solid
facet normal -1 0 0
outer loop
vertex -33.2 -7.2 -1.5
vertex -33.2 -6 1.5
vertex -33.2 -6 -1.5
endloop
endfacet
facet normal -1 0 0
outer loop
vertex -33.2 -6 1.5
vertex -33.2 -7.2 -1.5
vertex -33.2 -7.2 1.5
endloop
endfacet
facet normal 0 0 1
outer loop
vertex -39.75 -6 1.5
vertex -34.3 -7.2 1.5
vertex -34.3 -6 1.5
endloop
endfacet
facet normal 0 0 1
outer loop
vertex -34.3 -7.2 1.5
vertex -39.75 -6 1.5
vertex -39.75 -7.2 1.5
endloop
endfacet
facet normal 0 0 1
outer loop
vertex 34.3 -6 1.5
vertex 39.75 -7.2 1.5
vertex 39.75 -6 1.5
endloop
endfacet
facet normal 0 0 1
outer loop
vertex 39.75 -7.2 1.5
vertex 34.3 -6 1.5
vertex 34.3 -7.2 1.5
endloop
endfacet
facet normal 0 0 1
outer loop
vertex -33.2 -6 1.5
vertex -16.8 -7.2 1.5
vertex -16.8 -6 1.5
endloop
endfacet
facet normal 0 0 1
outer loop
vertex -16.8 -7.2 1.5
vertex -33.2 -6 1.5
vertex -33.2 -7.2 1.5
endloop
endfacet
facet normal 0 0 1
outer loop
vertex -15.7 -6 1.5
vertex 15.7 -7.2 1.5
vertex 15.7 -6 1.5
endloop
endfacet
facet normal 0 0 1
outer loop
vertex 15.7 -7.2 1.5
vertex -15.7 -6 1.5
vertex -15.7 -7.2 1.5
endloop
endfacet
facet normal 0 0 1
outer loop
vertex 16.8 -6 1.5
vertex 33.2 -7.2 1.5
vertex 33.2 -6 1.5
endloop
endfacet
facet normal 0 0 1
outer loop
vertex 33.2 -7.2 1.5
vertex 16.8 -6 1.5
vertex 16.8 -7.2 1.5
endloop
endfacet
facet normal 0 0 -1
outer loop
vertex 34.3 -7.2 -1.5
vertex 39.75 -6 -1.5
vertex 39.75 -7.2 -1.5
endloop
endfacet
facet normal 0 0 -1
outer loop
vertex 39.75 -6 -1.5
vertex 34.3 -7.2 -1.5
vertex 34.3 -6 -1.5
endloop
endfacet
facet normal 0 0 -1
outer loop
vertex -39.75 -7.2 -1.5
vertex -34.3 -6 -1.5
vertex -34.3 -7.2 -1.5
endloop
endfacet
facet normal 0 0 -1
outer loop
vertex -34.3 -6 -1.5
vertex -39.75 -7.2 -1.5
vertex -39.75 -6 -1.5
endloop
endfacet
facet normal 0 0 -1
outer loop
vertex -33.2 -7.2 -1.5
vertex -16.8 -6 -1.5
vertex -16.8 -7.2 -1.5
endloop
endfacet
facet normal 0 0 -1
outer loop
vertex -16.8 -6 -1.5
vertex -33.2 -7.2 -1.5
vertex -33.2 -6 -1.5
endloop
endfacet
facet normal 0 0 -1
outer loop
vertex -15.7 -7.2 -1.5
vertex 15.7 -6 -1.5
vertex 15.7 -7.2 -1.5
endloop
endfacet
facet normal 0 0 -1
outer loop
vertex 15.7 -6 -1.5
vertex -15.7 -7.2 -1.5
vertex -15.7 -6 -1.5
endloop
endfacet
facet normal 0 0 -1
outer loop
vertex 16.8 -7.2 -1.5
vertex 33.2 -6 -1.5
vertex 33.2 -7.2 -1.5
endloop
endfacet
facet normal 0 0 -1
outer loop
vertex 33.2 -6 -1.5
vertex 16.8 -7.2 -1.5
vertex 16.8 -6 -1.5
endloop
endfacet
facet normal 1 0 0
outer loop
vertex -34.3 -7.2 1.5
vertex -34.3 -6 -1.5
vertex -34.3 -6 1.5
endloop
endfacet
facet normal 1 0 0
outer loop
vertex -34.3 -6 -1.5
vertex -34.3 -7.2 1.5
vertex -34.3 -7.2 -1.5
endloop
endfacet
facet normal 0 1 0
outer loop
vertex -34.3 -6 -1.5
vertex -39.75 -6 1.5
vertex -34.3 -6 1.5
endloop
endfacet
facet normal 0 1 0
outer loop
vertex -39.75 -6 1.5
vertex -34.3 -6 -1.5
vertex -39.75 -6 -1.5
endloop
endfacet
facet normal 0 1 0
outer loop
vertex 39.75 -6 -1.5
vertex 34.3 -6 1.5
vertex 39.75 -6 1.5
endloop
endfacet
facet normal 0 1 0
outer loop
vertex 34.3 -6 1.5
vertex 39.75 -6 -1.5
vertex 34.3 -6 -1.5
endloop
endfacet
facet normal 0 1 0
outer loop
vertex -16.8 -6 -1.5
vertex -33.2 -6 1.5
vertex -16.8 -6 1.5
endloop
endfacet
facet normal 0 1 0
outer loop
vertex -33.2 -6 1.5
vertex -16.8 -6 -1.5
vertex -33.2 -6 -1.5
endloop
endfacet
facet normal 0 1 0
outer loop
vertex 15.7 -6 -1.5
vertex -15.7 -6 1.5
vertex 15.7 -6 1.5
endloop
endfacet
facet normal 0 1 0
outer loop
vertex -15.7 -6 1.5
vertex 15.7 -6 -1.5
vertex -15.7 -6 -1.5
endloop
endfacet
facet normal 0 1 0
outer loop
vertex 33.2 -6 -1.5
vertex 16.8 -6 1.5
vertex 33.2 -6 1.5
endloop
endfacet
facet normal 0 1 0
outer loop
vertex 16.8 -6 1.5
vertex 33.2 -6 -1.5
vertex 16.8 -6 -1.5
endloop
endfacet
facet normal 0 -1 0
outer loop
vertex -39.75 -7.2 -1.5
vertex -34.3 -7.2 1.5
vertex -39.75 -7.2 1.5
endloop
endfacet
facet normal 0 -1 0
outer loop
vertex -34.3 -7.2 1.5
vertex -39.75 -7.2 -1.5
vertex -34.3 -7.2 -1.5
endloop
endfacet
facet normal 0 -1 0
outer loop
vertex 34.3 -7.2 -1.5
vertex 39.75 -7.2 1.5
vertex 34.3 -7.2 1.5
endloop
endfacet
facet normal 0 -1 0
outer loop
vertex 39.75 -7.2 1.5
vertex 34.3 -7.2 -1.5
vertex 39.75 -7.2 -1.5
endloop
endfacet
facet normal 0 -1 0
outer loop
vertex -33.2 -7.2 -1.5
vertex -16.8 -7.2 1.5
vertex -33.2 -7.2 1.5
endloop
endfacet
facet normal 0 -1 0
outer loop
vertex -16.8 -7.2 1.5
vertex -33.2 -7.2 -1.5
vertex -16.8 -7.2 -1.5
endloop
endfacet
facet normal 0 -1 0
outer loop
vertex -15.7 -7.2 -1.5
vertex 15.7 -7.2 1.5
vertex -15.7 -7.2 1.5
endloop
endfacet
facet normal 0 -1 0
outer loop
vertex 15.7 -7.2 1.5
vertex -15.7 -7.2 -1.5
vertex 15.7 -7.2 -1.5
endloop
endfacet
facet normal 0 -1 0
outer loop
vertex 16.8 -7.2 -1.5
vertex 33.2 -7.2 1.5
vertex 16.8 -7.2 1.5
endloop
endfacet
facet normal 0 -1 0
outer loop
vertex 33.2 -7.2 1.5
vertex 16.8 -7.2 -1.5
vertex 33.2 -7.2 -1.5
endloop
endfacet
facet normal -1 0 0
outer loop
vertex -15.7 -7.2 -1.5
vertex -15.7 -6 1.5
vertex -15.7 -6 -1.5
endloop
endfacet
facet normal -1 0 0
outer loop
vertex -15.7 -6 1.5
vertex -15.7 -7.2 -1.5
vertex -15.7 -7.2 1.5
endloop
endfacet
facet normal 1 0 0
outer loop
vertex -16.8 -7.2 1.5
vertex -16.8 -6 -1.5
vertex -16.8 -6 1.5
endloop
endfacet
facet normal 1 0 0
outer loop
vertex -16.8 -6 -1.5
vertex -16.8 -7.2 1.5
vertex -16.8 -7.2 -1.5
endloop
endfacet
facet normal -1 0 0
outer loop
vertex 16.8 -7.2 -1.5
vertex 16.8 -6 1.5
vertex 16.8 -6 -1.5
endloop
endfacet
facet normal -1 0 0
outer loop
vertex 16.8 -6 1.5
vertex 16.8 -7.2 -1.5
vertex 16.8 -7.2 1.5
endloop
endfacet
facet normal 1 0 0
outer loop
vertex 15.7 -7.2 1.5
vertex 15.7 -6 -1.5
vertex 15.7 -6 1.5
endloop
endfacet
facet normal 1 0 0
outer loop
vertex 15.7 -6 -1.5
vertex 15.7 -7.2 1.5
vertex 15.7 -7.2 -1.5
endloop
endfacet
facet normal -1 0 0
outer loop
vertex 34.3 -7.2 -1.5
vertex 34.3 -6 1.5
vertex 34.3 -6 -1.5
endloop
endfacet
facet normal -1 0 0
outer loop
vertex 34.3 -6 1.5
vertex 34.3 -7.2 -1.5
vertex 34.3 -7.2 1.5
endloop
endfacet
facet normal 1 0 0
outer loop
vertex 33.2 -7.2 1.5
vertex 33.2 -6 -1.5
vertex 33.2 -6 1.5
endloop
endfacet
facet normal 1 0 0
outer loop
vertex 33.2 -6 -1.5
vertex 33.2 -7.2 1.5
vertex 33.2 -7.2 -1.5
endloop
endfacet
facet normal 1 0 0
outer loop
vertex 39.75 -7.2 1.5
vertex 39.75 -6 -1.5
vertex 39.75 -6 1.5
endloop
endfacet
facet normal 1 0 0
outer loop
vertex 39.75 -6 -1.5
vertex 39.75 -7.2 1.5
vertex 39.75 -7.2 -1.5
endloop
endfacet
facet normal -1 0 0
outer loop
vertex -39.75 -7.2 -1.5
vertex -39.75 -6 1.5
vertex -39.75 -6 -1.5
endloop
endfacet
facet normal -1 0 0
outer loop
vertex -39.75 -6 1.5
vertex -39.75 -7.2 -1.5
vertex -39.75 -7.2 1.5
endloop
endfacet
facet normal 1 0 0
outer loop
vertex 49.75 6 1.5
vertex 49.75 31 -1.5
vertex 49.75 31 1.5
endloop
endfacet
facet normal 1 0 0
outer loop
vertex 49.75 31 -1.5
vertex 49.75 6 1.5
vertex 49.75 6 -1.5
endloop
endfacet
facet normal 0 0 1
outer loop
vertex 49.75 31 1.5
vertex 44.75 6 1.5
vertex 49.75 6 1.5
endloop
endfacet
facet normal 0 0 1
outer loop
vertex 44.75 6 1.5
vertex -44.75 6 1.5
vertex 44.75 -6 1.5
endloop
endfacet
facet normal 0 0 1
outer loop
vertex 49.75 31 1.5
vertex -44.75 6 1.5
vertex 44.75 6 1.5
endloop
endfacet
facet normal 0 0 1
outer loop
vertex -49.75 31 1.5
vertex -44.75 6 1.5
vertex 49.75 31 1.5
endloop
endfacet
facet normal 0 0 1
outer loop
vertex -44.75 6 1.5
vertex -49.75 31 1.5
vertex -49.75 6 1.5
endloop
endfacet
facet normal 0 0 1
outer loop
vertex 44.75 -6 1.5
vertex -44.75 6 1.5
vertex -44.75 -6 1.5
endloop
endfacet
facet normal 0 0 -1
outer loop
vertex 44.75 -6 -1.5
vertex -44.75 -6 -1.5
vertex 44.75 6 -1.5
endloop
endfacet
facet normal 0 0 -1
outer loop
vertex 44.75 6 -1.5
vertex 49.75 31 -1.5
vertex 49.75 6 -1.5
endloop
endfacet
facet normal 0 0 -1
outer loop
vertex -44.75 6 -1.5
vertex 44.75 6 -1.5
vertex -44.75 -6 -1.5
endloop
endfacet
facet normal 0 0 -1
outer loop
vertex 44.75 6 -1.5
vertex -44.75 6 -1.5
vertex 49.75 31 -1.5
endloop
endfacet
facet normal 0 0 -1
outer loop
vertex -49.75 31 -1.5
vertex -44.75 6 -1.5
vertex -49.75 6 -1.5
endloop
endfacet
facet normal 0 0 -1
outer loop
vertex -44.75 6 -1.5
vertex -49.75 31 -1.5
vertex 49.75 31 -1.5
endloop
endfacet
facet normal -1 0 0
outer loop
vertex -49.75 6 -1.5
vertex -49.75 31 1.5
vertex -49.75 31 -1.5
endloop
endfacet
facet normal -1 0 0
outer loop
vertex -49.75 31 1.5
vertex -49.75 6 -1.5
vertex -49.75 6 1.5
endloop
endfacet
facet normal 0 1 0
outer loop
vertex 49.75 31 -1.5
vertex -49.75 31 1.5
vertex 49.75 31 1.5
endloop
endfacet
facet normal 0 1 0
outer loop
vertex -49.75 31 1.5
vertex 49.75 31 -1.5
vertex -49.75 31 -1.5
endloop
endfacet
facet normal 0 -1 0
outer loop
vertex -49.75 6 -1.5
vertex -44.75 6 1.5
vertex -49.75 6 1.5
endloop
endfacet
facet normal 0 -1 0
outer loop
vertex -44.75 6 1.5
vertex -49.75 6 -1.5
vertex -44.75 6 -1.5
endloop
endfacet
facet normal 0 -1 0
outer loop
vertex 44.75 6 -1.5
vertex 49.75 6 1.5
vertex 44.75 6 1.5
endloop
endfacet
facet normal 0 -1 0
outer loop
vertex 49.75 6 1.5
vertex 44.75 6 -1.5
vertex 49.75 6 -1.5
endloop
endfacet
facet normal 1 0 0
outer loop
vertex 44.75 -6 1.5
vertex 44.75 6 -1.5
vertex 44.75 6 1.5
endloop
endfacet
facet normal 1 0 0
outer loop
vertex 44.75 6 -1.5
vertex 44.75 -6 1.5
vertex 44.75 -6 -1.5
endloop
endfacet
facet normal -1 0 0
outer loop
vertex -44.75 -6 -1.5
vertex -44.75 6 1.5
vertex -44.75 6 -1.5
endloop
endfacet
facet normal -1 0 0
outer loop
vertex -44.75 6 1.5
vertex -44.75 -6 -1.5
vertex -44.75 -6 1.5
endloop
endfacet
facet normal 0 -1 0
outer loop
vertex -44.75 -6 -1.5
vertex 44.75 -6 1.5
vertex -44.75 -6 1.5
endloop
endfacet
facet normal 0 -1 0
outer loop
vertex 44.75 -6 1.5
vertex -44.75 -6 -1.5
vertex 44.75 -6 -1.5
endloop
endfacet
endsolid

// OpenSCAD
railWidth = 1.1;
railCentres = 17.5;
railToPlatformHeight = 12;
trackCentreToPlatformEdge = 19.75;
trackCentreToSleeper = 14.75;
trackToTrackCentre = 50;

topWidth = trackCentreToPlatformEdge + trackToTrackCentre + trackCentreToPlatformEdge + 10;
topHeight = 25;

middleWidth = trackCentreToPlatformEdge + trackToTrackCentre + trackCentreToPlatformEdge;
middleHeight = railToPlatformHeight;

bottomWidth = trackCentreToSleeper + trackToTrackCentre + trackCentreToSleeper;
bottomHeight = 1.2;


templateThickness = 3;

// top part of template
module templateTop() {
cube([topWidth, topHeight, templateThickness], center = true);
    
}

// middle part of template
module templateMiddle() {
cube([middleWidth, middleHeight, templateThickness], center = true);
}

// Track part of template
module templateBottom() {
difference() {
    cube([bottomWidth, bottomHeight, templateThickness], center = true);
    translate([-trackToTrackCentre / 2, 0, 0])
    union() {
        translate([-railCentres / 2, 0, 0]) cube([railWidth, bottomHeight, templateThickness], center = true);
        translate([railCentres / 2, 0, 0]) cube([railWidth, bottomHeight, templateThickness], center = true);
    }
    translate([trackToTrackCentre / 2, 0, 0])
    union() {
        translate([-railCentres / 2, 0, 0]) cube([railWidth, bottomHeight, templateThickness], center = true);
        translate([railCentres / 2, 0, 0]) cube([railWidth, bottomHeight, templateThickness], center = true);
    }
}
}


translate([0, (middleHeight / 2) + (topHeight / 2), 0]) templateTop();
translate([0, 0, 0]) templateMiddle();
translate([0, -(middleHeight / 2) - (bottomHeight / 2), 0]) templateBottom();
